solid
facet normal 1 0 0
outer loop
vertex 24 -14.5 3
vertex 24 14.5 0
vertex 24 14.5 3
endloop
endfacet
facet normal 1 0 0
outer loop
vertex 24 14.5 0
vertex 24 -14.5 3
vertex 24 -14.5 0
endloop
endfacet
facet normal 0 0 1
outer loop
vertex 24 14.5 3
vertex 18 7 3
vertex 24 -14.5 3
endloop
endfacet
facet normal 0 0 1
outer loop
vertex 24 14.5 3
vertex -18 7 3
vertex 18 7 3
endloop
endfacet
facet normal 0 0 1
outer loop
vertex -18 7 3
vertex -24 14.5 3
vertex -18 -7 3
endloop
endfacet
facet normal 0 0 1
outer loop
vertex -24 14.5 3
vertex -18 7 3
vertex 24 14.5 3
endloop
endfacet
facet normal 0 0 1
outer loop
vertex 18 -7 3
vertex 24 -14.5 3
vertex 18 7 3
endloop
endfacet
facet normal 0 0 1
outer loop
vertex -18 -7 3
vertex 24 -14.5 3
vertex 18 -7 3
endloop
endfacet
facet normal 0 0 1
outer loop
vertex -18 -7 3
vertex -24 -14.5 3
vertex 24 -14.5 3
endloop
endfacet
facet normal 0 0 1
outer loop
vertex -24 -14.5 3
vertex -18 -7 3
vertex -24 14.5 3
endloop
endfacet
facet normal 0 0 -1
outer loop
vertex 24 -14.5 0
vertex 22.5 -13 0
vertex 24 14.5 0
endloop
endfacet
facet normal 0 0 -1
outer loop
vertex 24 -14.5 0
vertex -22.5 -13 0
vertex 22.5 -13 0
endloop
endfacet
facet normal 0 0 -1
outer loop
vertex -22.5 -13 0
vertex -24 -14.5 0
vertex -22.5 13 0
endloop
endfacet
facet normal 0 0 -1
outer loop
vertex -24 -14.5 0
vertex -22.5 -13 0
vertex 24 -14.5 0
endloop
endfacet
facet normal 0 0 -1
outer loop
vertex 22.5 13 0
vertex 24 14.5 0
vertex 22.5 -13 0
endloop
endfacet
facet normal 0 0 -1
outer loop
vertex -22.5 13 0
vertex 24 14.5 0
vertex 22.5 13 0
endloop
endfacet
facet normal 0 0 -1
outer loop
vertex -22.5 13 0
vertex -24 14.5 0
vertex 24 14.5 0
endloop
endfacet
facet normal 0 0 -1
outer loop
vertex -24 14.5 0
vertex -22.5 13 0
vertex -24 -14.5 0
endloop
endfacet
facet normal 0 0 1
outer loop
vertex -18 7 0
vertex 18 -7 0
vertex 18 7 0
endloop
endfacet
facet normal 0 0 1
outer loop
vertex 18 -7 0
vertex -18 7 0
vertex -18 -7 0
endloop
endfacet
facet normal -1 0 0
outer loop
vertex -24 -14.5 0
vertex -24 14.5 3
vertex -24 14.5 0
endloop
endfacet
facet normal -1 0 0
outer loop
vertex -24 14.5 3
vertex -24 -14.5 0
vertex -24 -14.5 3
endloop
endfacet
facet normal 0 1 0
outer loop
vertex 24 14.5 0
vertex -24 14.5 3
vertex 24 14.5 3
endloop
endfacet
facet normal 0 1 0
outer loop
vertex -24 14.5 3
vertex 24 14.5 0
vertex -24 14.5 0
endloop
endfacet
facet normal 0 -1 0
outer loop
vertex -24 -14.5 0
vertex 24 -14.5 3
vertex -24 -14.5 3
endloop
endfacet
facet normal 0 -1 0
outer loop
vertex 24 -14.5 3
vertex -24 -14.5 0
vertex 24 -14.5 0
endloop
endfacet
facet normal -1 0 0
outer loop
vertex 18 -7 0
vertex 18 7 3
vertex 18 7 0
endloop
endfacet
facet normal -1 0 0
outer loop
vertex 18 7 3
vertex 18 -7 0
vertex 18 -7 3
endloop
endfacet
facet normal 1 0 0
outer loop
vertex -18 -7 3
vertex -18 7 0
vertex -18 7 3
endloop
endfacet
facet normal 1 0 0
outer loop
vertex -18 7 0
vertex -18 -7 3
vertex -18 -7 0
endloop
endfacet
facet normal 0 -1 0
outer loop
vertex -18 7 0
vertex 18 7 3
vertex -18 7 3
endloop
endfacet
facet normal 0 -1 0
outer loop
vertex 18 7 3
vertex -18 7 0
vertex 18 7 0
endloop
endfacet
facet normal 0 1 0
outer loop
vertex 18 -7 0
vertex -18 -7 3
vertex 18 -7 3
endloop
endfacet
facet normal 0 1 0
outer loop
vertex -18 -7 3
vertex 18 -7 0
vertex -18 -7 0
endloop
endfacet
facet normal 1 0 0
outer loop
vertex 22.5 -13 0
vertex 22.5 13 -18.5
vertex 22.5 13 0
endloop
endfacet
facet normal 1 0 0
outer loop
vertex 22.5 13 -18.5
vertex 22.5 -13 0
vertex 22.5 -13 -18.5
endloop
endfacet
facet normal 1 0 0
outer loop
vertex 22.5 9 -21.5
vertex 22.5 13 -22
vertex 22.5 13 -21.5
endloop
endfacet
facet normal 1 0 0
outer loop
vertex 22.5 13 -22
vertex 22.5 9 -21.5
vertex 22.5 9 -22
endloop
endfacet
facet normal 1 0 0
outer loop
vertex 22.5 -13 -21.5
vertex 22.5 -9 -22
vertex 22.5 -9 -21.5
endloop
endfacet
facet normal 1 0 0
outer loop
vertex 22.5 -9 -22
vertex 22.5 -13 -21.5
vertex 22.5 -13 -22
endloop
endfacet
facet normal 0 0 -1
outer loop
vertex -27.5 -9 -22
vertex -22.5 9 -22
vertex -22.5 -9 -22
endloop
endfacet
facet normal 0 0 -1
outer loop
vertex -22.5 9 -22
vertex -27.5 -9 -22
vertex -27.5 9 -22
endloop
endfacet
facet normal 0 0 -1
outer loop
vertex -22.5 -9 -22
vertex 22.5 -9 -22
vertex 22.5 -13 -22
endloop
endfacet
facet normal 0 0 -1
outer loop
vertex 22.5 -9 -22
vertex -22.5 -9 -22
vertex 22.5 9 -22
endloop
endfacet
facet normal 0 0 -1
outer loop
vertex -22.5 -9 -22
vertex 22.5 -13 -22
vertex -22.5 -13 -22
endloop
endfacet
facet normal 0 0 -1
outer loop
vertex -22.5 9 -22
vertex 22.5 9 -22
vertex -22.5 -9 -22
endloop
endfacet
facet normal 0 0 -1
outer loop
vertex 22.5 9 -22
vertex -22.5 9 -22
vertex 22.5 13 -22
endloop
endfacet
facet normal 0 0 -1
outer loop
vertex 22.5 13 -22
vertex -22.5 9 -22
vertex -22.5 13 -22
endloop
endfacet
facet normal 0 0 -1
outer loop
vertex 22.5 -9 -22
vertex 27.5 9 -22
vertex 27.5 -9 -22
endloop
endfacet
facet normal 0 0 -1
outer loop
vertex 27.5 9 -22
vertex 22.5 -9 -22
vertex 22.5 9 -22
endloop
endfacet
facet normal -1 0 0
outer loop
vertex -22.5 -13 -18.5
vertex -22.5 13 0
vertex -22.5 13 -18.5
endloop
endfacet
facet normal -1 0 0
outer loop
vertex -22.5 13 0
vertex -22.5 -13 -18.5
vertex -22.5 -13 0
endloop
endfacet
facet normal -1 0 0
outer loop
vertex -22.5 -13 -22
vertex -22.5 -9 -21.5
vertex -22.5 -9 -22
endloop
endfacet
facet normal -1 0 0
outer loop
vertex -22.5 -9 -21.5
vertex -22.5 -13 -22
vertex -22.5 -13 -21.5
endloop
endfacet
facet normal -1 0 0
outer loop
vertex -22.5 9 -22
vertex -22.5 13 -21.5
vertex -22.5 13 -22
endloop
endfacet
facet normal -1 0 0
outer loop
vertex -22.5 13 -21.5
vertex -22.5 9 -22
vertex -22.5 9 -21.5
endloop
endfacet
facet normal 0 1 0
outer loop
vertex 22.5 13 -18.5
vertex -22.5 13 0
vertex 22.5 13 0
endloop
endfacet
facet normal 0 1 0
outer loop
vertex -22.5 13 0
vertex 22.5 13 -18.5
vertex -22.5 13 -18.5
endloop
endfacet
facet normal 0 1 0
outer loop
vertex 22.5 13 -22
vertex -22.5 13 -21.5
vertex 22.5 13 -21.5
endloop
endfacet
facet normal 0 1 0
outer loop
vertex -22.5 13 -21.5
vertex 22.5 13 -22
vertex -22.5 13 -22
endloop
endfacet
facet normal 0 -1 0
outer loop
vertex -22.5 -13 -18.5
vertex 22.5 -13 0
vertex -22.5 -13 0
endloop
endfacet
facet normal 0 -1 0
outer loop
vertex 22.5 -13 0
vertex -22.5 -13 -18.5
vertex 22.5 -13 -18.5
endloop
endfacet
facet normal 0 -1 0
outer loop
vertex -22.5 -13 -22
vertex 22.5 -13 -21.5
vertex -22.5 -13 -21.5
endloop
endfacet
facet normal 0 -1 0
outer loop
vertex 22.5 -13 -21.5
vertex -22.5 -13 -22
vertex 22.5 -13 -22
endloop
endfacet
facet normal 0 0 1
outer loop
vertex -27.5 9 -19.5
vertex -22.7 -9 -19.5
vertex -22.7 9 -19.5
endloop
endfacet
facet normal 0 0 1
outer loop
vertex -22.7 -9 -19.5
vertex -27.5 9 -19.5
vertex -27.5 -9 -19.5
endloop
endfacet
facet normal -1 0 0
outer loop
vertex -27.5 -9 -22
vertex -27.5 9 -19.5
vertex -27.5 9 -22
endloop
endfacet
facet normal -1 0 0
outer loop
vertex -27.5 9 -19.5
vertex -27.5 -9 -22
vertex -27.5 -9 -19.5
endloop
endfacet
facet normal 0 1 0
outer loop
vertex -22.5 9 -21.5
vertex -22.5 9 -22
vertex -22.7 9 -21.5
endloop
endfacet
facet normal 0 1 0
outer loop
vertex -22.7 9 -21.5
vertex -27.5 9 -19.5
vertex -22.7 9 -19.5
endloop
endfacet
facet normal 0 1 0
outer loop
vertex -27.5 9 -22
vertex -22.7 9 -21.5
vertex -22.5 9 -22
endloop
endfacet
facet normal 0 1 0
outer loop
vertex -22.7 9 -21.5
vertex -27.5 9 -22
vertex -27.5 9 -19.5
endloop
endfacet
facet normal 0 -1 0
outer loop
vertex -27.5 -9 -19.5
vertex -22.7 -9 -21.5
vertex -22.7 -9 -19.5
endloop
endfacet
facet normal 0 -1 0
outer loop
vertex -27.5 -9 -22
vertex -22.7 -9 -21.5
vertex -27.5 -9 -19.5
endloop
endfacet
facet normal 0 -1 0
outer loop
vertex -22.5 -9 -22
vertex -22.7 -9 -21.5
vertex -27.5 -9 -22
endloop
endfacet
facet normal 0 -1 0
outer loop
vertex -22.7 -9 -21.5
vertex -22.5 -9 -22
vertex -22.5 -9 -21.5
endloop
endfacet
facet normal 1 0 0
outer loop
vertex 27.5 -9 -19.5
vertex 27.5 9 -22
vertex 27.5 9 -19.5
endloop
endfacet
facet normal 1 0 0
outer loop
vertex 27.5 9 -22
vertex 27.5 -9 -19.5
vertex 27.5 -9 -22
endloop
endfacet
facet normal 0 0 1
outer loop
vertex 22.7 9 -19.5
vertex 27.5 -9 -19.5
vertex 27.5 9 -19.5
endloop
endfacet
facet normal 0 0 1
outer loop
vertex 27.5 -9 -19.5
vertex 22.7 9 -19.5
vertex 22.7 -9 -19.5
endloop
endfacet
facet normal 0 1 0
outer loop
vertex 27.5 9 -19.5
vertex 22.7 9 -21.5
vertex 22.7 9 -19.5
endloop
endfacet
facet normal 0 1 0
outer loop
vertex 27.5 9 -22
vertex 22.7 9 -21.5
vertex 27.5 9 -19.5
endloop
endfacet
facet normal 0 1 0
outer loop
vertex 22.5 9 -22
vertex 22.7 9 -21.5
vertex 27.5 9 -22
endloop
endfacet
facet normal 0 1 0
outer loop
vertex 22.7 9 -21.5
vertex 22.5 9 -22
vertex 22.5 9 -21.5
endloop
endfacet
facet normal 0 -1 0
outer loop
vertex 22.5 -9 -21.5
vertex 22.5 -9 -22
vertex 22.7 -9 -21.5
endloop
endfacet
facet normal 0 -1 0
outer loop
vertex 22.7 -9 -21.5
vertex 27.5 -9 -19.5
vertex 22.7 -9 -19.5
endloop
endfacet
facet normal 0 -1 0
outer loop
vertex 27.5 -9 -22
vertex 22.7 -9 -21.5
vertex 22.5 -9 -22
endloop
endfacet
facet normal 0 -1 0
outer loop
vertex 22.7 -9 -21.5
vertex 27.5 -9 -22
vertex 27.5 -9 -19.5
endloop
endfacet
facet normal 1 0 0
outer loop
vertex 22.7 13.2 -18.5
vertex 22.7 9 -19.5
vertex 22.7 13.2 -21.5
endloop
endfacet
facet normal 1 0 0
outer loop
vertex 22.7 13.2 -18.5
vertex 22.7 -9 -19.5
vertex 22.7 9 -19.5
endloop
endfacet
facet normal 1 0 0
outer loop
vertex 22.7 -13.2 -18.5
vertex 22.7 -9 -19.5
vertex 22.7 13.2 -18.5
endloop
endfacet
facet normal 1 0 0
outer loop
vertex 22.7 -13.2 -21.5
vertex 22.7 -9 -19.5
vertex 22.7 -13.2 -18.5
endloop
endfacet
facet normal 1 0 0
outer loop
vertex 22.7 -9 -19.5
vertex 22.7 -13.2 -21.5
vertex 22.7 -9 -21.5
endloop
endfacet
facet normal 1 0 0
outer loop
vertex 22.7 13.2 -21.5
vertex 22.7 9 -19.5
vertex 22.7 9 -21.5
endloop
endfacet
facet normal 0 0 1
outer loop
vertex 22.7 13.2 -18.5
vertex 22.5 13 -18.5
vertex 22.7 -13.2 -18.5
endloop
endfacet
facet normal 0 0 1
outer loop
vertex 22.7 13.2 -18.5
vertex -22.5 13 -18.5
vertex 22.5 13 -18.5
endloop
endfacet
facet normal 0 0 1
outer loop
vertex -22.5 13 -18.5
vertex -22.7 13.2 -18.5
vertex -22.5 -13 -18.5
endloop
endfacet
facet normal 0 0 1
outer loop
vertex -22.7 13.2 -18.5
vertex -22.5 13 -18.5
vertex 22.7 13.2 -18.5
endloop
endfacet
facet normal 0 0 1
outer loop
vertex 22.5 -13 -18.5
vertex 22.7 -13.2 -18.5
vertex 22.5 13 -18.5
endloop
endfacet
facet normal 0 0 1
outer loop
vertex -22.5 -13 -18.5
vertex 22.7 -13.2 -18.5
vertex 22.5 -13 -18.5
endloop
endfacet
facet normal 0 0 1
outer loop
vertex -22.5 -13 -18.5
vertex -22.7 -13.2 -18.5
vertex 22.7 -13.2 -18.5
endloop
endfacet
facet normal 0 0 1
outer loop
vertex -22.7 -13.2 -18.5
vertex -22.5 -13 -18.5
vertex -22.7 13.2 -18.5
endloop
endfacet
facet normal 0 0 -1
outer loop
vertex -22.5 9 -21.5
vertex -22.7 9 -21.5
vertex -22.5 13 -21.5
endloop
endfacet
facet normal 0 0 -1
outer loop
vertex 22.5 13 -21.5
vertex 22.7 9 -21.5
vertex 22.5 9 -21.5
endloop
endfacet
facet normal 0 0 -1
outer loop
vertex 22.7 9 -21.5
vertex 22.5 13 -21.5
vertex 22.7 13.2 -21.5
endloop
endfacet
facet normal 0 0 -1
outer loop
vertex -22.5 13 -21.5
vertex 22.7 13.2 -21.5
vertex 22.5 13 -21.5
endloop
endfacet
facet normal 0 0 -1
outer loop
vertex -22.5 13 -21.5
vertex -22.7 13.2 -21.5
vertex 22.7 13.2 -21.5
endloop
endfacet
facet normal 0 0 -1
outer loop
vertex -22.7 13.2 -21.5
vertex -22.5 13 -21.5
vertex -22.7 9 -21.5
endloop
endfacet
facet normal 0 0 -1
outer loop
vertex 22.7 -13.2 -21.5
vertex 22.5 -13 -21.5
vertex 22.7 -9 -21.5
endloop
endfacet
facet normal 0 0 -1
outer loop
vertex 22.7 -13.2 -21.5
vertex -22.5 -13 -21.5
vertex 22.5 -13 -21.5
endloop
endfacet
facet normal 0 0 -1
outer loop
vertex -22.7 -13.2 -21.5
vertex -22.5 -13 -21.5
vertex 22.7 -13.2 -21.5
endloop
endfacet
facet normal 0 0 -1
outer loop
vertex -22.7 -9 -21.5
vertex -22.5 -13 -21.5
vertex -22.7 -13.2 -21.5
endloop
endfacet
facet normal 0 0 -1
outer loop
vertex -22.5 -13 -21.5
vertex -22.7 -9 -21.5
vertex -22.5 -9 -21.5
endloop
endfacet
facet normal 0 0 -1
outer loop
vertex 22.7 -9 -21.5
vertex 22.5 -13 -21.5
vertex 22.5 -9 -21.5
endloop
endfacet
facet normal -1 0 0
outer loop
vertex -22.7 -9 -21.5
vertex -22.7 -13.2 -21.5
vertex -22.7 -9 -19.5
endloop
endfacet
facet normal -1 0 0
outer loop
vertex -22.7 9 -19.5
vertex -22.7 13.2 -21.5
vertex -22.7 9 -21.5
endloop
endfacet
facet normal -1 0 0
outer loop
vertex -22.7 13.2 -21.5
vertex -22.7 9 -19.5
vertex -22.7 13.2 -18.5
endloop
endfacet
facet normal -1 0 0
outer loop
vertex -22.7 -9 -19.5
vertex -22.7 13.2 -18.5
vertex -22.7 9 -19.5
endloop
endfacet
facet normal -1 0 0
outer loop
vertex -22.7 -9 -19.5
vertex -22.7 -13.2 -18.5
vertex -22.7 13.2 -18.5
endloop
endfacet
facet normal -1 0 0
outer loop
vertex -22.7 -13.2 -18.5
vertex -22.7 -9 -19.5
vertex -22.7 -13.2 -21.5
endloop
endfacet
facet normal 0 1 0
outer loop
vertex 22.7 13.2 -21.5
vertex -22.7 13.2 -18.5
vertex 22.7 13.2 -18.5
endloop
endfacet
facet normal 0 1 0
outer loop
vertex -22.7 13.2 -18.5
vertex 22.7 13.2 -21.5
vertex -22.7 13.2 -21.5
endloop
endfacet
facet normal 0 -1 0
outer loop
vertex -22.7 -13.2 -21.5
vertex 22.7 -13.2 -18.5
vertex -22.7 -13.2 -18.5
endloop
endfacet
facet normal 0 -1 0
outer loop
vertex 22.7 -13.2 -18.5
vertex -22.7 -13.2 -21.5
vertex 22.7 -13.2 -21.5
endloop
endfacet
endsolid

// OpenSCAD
// Parameters
voltage_range_v = 100; //[50:200:10]
current_range_a = 10; //[5:20:1]
bezel_width = 48; //[24:96:1]
bezel_height = 29; //[15:58:1]
bezel_thickness = 3; //[1.5:6:0.5]
body_width = 45; //[22.5:90:1]
body_height = 26; //[13:52:1]
body_depth = 22; //[11:44:1]
aperture_width = 36; //[18:72:1]
aperture_height = 14; //[7:28:1]
corner_radius = 2; //[0:6:0.5]
panel_thickness_supported_min = 1; //[0.5:2:0.1]
panel_thickness_supported_max = 4; //[2:8:0.5]
tab_width = 6; //[3:12:0.5]
tab_height = 18; //[9:36:1]
tab_depth = 2.5; //[1:6:0.5]
cutout_clearance = 0.2; //[0:1:0.05]
rear_clearance_depth = 30; //[15:60:1]
connector_clearance = 10; //[5:25:1]
button_diameter = 4; //[2:8:0.5]
button_height = 1.5; //[0.5:4:0.5]
button_offset_x = 0; //[-10:10:0.5]
button_offset_y = -9; //[-14:14:0.5]
eps_overlap = 1; //[0.5:2:0.1]
panel_thickness = 3; //[1:6:0.5]
panel_margin = 12; //[6:30:1]
pcb_thickness = 1.6; //[0.8:3.2:0.1]
pcb_clearance = 1; //[0.5:3:0.5]

// Panel Meter - complete geometry
module panel_meter() {
  color("Black") {
    // Front Bezel
    difference() {
      translate([0, 0, bezel_thickness / 2])
        cube([bezel_width, bezel_height, bezel_thickness], center=true);
      translate([0, 0, bezel_thickness / 2])
        cube([aperture_width, aperture_height, bezel_thickness + 2 * eps_overlap], center=true);
    }
    // Rear Body
    translate([0, 0, -(body_depth / 2)])
      cube([body_width, body_height, body_depth], center=true);
    // Side Tabs
    translate([-(body_width / 2 + tab_width / 2 - eps_overlap), 0, -(body_depth - tab_depth / 2)])
      cube([tab_width, tab_height, tab_depth], center=true);
    translate([(body_width / 2 + tab_width / 2 - eps_overlap), 0, -(body_depth - tab_depth / 2)])
      cube([tab_width, tab_height, tab_depth], center=true);
  }
}

// Panel Meter Cutout - complete geometry
module panel_meter_cutout() {
  color("Silver") {
    difference() {
      translate([0, 0, panel_thickness / 2])
        cube([body_width + 2 * cutout_clearance, body_height + 2 * cutout_clearance, panel_thickness], center=true);
      translate([0, 0, panel_thickness / 2])
        cube([body_width, body_height, panel_thickness + eps_overlap], center=true);
    }
  }
}

// Panel Meter Button - complete geometry
module panel_meter_button() {
  color("White") {
    translate([button_offset_x, button_offset_y, bezel_thickness / 2 + button_height / 2 - eps_overlap])
      cylinder(r=button_diameter / 2, h=button_height, center=true);
  }
}

// Assembly
module assembly() {
  panel_meter();
  translate([0, 0, -(panel_thickness / 2 + rear_clearance_depth / 2 + connector_clearance / 2)])
    panel_meter_cutout();
  panel_meter_button();
}

assembly();
